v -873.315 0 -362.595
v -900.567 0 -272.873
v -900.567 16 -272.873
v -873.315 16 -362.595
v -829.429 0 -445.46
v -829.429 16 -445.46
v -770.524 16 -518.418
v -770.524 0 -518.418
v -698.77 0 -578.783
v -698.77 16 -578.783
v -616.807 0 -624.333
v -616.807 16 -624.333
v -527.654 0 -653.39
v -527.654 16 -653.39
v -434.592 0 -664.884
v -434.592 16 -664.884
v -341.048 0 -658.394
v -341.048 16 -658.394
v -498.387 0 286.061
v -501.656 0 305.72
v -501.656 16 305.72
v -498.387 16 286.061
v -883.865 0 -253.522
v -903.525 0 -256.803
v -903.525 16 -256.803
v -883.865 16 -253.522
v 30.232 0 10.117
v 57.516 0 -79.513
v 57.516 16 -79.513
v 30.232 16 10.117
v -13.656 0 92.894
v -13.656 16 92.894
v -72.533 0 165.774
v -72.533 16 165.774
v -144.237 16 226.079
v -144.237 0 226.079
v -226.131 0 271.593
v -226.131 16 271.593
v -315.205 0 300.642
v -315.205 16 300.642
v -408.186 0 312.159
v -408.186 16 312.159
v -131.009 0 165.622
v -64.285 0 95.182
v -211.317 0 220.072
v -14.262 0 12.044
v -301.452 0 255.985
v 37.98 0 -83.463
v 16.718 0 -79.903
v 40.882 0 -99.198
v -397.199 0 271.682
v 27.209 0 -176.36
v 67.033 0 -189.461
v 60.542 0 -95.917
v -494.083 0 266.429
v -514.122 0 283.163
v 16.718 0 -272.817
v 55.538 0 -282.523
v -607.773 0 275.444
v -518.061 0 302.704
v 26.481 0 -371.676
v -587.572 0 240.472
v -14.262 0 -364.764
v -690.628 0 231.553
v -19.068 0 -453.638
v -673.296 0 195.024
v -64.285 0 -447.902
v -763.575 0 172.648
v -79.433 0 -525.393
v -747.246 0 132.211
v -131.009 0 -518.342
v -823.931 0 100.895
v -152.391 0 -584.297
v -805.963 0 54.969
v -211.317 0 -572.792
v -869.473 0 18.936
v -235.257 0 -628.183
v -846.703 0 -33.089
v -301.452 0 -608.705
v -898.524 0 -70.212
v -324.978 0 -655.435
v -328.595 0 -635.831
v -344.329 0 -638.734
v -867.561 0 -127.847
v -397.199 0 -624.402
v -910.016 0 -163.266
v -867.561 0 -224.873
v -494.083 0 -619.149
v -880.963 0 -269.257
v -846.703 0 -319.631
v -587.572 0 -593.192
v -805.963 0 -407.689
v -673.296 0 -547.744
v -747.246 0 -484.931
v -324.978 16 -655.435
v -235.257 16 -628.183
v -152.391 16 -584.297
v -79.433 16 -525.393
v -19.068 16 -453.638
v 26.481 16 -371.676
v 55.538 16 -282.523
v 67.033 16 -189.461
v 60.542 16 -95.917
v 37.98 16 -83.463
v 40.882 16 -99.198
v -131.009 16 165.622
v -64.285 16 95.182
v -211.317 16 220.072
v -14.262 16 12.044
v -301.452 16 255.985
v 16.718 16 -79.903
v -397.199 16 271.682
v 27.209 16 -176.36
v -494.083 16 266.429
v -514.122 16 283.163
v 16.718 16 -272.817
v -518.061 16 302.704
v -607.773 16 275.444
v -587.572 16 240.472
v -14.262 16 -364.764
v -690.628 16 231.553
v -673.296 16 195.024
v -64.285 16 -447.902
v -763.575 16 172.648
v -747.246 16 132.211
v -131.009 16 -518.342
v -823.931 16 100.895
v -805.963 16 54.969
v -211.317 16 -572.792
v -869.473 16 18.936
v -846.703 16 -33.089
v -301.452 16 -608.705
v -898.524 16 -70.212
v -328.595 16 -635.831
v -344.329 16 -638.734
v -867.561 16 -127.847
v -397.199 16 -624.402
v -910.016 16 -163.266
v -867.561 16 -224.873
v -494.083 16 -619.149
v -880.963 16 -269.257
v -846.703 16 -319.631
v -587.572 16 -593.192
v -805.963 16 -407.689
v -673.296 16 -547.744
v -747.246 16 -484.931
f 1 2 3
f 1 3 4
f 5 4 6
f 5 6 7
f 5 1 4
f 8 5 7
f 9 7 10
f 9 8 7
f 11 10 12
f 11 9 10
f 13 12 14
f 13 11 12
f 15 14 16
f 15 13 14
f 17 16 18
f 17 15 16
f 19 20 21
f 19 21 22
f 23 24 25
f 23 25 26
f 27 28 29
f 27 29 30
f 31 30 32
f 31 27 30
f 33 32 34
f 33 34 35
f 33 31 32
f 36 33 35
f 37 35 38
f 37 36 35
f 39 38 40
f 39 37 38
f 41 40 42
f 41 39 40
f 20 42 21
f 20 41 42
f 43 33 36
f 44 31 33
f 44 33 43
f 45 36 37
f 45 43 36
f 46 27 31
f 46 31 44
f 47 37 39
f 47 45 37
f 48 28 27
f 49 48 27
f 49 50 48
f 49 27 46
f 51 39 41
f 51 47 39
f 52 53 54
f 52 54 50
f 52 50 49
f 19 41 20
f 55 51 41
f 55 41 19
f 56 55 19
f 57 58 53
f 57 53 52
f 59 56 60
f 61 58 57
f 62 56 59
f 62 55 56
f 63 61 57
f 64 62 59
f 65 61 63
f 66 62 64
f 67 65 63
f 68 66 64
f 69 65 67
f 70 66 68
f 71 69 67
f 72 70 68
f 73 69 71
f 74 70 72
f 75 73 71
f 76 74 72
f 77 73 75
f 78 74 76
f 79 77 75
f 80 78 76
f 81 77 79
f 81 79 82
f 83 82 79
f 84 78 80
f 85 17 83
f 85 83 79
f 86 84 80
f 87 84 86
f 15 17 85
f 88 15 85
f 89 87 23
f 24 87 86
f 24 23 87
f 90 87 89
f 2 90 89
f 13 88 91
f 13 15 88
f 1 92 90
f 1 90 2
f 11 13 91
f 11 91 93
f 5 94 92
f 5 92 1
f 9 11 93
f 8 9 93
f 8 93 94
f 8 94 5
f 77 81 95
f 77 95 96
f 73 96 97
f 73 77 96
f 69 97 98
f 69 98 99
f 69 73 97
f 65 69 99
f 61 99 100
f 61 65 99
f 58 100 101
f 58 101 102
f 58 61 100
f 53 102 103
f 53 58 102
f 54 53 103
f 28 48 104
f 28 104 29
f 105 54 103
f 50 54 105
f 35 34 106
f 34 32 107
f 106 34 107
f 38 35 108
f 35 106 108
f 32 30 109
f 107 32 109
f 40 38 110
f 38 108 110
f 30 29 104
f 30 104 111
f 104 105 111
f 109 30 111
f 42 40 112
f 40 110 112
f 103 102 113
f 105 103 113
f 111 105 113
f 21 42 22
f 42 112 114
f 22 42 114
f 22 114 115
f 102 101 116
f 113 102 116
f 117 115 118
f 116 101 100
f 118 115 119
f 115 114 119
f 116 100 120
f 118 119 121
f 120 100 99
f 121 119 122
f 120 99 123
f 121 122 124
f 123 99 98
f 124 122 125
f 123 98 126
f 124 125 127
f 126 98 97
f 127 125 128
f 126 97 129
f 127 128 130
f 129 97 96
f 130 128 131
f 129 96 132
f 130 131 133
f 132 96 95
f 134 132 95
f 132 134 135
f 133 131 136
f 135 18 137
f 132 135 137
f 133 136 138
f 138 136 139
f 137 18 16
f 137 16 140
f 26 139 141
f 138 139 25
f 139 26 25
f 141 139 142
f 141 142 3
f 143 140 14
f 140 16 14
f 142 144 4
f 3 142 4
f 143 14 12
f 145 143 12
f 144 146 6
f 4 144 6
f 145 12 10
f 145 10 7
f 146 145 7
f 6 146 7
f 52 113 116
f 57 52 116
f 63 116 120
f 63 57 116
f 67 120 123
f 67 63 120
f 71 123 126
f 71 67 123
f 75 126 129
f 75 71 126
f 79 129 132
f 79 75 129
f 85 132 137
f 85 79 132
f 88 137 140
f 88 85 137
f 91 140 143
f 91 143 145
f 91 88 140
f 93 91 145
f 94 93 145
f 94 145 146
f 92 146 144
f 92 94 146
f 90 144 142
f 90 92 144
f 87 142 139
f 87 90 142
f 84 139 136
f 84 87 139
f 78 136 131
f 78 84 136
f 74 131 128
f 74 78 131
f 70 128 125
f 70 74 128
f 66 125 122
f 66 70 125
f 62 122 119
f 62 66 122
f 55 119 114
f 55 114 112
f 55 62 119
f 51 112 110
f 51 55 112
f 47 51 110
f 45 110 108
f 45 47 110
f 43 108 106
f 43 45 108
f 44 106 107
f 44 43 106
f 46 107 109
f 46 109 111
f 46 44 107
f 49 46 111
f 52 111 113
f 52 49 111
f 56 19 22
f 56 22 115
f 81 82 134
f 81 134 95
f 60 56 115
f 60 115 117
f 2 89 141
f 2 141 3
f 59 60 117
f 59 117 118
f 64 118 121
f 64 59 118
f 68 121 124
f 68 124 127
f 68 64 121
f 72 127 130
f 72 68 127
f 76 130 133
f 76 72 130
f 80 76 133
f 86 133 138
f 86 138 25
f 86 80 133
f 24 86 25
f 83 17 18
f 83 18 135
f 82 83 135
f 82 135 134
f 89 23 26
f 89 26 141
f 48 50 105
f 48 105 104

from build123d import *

# Parameters (mm, degrees)
SKETCH_1_R      = 448.7
EXTRUDE_2_DEPTH = 16


with BuildPart() as part:
    # Эскиз1 → Бобышка-Вытянуть2 (new body)
    with BuildSketch(Plane(origin=(0, 0, 0), x_dir=(1, 0, 0), z_dir=(0, 1, 0))):
        with BuildLine():
            Line((-344.32913914, 638.733962842), (-328.594635558, 635.831309398))
            Line((-328.594635558, 635.831309398), (-324.978198629, 655.435041258))
            ThreePointArc((-324.978198629, 655.435041258), (-19.068388145, 453.638466212), (60.542297577, 95.916774711))
            Line((60.542297577, 95.916774711), (40.882449344, 99.197669255))
            Line((40.882449344, 99.197669255), (37.979795899, 83.463165673))
            Line((37.979795899, 83.463165673), (57.516225139, 79.513249965))
            ThreePointArc((57.516225139, 79.513249965), (-144.23681545, -226.079457497), (-501.65610266, -305.720184329))
            Line((-501.65610266, -305.720184329), (-498.386954822, -286.060743027))
            Line((-498.386954822, -286.060743027), (-514.12229676, -283.162637766))
            Line((-514.12229676, -283.162637766), (-518.061372416, -302.703594153))
            ThreePointArc((-518.061372416, -302.703594153), (-823.9309706, -100.894655009), (-903.52528096, 256.803268902))
            Line((-903.52528096, 256.803268902), (-883.865432727, 253.522374358))
            Line((-883.865432727, 253.522374358), (-880.962779283, 269.256877941))
            Line((-880.962779283, 269.256877941), (-900.566511143, 272.873314869))
            ThreePointArc((-900.566511143, 272.873314869), (-698.769936097, 578.783125354), (-341.048244596, 658.393811076))
            Line((-341.048244596, 658.393811076), (-344.32913914, 638.733962842))
        make_face()
        with Locations((-421.491491692, 176.360021807)):
            Circle(SKETCH_1_R, mode=Mode.SUBTRACT)
    extrude(amount=EXTRUDE_2_DEPTH)


solid = part.part
